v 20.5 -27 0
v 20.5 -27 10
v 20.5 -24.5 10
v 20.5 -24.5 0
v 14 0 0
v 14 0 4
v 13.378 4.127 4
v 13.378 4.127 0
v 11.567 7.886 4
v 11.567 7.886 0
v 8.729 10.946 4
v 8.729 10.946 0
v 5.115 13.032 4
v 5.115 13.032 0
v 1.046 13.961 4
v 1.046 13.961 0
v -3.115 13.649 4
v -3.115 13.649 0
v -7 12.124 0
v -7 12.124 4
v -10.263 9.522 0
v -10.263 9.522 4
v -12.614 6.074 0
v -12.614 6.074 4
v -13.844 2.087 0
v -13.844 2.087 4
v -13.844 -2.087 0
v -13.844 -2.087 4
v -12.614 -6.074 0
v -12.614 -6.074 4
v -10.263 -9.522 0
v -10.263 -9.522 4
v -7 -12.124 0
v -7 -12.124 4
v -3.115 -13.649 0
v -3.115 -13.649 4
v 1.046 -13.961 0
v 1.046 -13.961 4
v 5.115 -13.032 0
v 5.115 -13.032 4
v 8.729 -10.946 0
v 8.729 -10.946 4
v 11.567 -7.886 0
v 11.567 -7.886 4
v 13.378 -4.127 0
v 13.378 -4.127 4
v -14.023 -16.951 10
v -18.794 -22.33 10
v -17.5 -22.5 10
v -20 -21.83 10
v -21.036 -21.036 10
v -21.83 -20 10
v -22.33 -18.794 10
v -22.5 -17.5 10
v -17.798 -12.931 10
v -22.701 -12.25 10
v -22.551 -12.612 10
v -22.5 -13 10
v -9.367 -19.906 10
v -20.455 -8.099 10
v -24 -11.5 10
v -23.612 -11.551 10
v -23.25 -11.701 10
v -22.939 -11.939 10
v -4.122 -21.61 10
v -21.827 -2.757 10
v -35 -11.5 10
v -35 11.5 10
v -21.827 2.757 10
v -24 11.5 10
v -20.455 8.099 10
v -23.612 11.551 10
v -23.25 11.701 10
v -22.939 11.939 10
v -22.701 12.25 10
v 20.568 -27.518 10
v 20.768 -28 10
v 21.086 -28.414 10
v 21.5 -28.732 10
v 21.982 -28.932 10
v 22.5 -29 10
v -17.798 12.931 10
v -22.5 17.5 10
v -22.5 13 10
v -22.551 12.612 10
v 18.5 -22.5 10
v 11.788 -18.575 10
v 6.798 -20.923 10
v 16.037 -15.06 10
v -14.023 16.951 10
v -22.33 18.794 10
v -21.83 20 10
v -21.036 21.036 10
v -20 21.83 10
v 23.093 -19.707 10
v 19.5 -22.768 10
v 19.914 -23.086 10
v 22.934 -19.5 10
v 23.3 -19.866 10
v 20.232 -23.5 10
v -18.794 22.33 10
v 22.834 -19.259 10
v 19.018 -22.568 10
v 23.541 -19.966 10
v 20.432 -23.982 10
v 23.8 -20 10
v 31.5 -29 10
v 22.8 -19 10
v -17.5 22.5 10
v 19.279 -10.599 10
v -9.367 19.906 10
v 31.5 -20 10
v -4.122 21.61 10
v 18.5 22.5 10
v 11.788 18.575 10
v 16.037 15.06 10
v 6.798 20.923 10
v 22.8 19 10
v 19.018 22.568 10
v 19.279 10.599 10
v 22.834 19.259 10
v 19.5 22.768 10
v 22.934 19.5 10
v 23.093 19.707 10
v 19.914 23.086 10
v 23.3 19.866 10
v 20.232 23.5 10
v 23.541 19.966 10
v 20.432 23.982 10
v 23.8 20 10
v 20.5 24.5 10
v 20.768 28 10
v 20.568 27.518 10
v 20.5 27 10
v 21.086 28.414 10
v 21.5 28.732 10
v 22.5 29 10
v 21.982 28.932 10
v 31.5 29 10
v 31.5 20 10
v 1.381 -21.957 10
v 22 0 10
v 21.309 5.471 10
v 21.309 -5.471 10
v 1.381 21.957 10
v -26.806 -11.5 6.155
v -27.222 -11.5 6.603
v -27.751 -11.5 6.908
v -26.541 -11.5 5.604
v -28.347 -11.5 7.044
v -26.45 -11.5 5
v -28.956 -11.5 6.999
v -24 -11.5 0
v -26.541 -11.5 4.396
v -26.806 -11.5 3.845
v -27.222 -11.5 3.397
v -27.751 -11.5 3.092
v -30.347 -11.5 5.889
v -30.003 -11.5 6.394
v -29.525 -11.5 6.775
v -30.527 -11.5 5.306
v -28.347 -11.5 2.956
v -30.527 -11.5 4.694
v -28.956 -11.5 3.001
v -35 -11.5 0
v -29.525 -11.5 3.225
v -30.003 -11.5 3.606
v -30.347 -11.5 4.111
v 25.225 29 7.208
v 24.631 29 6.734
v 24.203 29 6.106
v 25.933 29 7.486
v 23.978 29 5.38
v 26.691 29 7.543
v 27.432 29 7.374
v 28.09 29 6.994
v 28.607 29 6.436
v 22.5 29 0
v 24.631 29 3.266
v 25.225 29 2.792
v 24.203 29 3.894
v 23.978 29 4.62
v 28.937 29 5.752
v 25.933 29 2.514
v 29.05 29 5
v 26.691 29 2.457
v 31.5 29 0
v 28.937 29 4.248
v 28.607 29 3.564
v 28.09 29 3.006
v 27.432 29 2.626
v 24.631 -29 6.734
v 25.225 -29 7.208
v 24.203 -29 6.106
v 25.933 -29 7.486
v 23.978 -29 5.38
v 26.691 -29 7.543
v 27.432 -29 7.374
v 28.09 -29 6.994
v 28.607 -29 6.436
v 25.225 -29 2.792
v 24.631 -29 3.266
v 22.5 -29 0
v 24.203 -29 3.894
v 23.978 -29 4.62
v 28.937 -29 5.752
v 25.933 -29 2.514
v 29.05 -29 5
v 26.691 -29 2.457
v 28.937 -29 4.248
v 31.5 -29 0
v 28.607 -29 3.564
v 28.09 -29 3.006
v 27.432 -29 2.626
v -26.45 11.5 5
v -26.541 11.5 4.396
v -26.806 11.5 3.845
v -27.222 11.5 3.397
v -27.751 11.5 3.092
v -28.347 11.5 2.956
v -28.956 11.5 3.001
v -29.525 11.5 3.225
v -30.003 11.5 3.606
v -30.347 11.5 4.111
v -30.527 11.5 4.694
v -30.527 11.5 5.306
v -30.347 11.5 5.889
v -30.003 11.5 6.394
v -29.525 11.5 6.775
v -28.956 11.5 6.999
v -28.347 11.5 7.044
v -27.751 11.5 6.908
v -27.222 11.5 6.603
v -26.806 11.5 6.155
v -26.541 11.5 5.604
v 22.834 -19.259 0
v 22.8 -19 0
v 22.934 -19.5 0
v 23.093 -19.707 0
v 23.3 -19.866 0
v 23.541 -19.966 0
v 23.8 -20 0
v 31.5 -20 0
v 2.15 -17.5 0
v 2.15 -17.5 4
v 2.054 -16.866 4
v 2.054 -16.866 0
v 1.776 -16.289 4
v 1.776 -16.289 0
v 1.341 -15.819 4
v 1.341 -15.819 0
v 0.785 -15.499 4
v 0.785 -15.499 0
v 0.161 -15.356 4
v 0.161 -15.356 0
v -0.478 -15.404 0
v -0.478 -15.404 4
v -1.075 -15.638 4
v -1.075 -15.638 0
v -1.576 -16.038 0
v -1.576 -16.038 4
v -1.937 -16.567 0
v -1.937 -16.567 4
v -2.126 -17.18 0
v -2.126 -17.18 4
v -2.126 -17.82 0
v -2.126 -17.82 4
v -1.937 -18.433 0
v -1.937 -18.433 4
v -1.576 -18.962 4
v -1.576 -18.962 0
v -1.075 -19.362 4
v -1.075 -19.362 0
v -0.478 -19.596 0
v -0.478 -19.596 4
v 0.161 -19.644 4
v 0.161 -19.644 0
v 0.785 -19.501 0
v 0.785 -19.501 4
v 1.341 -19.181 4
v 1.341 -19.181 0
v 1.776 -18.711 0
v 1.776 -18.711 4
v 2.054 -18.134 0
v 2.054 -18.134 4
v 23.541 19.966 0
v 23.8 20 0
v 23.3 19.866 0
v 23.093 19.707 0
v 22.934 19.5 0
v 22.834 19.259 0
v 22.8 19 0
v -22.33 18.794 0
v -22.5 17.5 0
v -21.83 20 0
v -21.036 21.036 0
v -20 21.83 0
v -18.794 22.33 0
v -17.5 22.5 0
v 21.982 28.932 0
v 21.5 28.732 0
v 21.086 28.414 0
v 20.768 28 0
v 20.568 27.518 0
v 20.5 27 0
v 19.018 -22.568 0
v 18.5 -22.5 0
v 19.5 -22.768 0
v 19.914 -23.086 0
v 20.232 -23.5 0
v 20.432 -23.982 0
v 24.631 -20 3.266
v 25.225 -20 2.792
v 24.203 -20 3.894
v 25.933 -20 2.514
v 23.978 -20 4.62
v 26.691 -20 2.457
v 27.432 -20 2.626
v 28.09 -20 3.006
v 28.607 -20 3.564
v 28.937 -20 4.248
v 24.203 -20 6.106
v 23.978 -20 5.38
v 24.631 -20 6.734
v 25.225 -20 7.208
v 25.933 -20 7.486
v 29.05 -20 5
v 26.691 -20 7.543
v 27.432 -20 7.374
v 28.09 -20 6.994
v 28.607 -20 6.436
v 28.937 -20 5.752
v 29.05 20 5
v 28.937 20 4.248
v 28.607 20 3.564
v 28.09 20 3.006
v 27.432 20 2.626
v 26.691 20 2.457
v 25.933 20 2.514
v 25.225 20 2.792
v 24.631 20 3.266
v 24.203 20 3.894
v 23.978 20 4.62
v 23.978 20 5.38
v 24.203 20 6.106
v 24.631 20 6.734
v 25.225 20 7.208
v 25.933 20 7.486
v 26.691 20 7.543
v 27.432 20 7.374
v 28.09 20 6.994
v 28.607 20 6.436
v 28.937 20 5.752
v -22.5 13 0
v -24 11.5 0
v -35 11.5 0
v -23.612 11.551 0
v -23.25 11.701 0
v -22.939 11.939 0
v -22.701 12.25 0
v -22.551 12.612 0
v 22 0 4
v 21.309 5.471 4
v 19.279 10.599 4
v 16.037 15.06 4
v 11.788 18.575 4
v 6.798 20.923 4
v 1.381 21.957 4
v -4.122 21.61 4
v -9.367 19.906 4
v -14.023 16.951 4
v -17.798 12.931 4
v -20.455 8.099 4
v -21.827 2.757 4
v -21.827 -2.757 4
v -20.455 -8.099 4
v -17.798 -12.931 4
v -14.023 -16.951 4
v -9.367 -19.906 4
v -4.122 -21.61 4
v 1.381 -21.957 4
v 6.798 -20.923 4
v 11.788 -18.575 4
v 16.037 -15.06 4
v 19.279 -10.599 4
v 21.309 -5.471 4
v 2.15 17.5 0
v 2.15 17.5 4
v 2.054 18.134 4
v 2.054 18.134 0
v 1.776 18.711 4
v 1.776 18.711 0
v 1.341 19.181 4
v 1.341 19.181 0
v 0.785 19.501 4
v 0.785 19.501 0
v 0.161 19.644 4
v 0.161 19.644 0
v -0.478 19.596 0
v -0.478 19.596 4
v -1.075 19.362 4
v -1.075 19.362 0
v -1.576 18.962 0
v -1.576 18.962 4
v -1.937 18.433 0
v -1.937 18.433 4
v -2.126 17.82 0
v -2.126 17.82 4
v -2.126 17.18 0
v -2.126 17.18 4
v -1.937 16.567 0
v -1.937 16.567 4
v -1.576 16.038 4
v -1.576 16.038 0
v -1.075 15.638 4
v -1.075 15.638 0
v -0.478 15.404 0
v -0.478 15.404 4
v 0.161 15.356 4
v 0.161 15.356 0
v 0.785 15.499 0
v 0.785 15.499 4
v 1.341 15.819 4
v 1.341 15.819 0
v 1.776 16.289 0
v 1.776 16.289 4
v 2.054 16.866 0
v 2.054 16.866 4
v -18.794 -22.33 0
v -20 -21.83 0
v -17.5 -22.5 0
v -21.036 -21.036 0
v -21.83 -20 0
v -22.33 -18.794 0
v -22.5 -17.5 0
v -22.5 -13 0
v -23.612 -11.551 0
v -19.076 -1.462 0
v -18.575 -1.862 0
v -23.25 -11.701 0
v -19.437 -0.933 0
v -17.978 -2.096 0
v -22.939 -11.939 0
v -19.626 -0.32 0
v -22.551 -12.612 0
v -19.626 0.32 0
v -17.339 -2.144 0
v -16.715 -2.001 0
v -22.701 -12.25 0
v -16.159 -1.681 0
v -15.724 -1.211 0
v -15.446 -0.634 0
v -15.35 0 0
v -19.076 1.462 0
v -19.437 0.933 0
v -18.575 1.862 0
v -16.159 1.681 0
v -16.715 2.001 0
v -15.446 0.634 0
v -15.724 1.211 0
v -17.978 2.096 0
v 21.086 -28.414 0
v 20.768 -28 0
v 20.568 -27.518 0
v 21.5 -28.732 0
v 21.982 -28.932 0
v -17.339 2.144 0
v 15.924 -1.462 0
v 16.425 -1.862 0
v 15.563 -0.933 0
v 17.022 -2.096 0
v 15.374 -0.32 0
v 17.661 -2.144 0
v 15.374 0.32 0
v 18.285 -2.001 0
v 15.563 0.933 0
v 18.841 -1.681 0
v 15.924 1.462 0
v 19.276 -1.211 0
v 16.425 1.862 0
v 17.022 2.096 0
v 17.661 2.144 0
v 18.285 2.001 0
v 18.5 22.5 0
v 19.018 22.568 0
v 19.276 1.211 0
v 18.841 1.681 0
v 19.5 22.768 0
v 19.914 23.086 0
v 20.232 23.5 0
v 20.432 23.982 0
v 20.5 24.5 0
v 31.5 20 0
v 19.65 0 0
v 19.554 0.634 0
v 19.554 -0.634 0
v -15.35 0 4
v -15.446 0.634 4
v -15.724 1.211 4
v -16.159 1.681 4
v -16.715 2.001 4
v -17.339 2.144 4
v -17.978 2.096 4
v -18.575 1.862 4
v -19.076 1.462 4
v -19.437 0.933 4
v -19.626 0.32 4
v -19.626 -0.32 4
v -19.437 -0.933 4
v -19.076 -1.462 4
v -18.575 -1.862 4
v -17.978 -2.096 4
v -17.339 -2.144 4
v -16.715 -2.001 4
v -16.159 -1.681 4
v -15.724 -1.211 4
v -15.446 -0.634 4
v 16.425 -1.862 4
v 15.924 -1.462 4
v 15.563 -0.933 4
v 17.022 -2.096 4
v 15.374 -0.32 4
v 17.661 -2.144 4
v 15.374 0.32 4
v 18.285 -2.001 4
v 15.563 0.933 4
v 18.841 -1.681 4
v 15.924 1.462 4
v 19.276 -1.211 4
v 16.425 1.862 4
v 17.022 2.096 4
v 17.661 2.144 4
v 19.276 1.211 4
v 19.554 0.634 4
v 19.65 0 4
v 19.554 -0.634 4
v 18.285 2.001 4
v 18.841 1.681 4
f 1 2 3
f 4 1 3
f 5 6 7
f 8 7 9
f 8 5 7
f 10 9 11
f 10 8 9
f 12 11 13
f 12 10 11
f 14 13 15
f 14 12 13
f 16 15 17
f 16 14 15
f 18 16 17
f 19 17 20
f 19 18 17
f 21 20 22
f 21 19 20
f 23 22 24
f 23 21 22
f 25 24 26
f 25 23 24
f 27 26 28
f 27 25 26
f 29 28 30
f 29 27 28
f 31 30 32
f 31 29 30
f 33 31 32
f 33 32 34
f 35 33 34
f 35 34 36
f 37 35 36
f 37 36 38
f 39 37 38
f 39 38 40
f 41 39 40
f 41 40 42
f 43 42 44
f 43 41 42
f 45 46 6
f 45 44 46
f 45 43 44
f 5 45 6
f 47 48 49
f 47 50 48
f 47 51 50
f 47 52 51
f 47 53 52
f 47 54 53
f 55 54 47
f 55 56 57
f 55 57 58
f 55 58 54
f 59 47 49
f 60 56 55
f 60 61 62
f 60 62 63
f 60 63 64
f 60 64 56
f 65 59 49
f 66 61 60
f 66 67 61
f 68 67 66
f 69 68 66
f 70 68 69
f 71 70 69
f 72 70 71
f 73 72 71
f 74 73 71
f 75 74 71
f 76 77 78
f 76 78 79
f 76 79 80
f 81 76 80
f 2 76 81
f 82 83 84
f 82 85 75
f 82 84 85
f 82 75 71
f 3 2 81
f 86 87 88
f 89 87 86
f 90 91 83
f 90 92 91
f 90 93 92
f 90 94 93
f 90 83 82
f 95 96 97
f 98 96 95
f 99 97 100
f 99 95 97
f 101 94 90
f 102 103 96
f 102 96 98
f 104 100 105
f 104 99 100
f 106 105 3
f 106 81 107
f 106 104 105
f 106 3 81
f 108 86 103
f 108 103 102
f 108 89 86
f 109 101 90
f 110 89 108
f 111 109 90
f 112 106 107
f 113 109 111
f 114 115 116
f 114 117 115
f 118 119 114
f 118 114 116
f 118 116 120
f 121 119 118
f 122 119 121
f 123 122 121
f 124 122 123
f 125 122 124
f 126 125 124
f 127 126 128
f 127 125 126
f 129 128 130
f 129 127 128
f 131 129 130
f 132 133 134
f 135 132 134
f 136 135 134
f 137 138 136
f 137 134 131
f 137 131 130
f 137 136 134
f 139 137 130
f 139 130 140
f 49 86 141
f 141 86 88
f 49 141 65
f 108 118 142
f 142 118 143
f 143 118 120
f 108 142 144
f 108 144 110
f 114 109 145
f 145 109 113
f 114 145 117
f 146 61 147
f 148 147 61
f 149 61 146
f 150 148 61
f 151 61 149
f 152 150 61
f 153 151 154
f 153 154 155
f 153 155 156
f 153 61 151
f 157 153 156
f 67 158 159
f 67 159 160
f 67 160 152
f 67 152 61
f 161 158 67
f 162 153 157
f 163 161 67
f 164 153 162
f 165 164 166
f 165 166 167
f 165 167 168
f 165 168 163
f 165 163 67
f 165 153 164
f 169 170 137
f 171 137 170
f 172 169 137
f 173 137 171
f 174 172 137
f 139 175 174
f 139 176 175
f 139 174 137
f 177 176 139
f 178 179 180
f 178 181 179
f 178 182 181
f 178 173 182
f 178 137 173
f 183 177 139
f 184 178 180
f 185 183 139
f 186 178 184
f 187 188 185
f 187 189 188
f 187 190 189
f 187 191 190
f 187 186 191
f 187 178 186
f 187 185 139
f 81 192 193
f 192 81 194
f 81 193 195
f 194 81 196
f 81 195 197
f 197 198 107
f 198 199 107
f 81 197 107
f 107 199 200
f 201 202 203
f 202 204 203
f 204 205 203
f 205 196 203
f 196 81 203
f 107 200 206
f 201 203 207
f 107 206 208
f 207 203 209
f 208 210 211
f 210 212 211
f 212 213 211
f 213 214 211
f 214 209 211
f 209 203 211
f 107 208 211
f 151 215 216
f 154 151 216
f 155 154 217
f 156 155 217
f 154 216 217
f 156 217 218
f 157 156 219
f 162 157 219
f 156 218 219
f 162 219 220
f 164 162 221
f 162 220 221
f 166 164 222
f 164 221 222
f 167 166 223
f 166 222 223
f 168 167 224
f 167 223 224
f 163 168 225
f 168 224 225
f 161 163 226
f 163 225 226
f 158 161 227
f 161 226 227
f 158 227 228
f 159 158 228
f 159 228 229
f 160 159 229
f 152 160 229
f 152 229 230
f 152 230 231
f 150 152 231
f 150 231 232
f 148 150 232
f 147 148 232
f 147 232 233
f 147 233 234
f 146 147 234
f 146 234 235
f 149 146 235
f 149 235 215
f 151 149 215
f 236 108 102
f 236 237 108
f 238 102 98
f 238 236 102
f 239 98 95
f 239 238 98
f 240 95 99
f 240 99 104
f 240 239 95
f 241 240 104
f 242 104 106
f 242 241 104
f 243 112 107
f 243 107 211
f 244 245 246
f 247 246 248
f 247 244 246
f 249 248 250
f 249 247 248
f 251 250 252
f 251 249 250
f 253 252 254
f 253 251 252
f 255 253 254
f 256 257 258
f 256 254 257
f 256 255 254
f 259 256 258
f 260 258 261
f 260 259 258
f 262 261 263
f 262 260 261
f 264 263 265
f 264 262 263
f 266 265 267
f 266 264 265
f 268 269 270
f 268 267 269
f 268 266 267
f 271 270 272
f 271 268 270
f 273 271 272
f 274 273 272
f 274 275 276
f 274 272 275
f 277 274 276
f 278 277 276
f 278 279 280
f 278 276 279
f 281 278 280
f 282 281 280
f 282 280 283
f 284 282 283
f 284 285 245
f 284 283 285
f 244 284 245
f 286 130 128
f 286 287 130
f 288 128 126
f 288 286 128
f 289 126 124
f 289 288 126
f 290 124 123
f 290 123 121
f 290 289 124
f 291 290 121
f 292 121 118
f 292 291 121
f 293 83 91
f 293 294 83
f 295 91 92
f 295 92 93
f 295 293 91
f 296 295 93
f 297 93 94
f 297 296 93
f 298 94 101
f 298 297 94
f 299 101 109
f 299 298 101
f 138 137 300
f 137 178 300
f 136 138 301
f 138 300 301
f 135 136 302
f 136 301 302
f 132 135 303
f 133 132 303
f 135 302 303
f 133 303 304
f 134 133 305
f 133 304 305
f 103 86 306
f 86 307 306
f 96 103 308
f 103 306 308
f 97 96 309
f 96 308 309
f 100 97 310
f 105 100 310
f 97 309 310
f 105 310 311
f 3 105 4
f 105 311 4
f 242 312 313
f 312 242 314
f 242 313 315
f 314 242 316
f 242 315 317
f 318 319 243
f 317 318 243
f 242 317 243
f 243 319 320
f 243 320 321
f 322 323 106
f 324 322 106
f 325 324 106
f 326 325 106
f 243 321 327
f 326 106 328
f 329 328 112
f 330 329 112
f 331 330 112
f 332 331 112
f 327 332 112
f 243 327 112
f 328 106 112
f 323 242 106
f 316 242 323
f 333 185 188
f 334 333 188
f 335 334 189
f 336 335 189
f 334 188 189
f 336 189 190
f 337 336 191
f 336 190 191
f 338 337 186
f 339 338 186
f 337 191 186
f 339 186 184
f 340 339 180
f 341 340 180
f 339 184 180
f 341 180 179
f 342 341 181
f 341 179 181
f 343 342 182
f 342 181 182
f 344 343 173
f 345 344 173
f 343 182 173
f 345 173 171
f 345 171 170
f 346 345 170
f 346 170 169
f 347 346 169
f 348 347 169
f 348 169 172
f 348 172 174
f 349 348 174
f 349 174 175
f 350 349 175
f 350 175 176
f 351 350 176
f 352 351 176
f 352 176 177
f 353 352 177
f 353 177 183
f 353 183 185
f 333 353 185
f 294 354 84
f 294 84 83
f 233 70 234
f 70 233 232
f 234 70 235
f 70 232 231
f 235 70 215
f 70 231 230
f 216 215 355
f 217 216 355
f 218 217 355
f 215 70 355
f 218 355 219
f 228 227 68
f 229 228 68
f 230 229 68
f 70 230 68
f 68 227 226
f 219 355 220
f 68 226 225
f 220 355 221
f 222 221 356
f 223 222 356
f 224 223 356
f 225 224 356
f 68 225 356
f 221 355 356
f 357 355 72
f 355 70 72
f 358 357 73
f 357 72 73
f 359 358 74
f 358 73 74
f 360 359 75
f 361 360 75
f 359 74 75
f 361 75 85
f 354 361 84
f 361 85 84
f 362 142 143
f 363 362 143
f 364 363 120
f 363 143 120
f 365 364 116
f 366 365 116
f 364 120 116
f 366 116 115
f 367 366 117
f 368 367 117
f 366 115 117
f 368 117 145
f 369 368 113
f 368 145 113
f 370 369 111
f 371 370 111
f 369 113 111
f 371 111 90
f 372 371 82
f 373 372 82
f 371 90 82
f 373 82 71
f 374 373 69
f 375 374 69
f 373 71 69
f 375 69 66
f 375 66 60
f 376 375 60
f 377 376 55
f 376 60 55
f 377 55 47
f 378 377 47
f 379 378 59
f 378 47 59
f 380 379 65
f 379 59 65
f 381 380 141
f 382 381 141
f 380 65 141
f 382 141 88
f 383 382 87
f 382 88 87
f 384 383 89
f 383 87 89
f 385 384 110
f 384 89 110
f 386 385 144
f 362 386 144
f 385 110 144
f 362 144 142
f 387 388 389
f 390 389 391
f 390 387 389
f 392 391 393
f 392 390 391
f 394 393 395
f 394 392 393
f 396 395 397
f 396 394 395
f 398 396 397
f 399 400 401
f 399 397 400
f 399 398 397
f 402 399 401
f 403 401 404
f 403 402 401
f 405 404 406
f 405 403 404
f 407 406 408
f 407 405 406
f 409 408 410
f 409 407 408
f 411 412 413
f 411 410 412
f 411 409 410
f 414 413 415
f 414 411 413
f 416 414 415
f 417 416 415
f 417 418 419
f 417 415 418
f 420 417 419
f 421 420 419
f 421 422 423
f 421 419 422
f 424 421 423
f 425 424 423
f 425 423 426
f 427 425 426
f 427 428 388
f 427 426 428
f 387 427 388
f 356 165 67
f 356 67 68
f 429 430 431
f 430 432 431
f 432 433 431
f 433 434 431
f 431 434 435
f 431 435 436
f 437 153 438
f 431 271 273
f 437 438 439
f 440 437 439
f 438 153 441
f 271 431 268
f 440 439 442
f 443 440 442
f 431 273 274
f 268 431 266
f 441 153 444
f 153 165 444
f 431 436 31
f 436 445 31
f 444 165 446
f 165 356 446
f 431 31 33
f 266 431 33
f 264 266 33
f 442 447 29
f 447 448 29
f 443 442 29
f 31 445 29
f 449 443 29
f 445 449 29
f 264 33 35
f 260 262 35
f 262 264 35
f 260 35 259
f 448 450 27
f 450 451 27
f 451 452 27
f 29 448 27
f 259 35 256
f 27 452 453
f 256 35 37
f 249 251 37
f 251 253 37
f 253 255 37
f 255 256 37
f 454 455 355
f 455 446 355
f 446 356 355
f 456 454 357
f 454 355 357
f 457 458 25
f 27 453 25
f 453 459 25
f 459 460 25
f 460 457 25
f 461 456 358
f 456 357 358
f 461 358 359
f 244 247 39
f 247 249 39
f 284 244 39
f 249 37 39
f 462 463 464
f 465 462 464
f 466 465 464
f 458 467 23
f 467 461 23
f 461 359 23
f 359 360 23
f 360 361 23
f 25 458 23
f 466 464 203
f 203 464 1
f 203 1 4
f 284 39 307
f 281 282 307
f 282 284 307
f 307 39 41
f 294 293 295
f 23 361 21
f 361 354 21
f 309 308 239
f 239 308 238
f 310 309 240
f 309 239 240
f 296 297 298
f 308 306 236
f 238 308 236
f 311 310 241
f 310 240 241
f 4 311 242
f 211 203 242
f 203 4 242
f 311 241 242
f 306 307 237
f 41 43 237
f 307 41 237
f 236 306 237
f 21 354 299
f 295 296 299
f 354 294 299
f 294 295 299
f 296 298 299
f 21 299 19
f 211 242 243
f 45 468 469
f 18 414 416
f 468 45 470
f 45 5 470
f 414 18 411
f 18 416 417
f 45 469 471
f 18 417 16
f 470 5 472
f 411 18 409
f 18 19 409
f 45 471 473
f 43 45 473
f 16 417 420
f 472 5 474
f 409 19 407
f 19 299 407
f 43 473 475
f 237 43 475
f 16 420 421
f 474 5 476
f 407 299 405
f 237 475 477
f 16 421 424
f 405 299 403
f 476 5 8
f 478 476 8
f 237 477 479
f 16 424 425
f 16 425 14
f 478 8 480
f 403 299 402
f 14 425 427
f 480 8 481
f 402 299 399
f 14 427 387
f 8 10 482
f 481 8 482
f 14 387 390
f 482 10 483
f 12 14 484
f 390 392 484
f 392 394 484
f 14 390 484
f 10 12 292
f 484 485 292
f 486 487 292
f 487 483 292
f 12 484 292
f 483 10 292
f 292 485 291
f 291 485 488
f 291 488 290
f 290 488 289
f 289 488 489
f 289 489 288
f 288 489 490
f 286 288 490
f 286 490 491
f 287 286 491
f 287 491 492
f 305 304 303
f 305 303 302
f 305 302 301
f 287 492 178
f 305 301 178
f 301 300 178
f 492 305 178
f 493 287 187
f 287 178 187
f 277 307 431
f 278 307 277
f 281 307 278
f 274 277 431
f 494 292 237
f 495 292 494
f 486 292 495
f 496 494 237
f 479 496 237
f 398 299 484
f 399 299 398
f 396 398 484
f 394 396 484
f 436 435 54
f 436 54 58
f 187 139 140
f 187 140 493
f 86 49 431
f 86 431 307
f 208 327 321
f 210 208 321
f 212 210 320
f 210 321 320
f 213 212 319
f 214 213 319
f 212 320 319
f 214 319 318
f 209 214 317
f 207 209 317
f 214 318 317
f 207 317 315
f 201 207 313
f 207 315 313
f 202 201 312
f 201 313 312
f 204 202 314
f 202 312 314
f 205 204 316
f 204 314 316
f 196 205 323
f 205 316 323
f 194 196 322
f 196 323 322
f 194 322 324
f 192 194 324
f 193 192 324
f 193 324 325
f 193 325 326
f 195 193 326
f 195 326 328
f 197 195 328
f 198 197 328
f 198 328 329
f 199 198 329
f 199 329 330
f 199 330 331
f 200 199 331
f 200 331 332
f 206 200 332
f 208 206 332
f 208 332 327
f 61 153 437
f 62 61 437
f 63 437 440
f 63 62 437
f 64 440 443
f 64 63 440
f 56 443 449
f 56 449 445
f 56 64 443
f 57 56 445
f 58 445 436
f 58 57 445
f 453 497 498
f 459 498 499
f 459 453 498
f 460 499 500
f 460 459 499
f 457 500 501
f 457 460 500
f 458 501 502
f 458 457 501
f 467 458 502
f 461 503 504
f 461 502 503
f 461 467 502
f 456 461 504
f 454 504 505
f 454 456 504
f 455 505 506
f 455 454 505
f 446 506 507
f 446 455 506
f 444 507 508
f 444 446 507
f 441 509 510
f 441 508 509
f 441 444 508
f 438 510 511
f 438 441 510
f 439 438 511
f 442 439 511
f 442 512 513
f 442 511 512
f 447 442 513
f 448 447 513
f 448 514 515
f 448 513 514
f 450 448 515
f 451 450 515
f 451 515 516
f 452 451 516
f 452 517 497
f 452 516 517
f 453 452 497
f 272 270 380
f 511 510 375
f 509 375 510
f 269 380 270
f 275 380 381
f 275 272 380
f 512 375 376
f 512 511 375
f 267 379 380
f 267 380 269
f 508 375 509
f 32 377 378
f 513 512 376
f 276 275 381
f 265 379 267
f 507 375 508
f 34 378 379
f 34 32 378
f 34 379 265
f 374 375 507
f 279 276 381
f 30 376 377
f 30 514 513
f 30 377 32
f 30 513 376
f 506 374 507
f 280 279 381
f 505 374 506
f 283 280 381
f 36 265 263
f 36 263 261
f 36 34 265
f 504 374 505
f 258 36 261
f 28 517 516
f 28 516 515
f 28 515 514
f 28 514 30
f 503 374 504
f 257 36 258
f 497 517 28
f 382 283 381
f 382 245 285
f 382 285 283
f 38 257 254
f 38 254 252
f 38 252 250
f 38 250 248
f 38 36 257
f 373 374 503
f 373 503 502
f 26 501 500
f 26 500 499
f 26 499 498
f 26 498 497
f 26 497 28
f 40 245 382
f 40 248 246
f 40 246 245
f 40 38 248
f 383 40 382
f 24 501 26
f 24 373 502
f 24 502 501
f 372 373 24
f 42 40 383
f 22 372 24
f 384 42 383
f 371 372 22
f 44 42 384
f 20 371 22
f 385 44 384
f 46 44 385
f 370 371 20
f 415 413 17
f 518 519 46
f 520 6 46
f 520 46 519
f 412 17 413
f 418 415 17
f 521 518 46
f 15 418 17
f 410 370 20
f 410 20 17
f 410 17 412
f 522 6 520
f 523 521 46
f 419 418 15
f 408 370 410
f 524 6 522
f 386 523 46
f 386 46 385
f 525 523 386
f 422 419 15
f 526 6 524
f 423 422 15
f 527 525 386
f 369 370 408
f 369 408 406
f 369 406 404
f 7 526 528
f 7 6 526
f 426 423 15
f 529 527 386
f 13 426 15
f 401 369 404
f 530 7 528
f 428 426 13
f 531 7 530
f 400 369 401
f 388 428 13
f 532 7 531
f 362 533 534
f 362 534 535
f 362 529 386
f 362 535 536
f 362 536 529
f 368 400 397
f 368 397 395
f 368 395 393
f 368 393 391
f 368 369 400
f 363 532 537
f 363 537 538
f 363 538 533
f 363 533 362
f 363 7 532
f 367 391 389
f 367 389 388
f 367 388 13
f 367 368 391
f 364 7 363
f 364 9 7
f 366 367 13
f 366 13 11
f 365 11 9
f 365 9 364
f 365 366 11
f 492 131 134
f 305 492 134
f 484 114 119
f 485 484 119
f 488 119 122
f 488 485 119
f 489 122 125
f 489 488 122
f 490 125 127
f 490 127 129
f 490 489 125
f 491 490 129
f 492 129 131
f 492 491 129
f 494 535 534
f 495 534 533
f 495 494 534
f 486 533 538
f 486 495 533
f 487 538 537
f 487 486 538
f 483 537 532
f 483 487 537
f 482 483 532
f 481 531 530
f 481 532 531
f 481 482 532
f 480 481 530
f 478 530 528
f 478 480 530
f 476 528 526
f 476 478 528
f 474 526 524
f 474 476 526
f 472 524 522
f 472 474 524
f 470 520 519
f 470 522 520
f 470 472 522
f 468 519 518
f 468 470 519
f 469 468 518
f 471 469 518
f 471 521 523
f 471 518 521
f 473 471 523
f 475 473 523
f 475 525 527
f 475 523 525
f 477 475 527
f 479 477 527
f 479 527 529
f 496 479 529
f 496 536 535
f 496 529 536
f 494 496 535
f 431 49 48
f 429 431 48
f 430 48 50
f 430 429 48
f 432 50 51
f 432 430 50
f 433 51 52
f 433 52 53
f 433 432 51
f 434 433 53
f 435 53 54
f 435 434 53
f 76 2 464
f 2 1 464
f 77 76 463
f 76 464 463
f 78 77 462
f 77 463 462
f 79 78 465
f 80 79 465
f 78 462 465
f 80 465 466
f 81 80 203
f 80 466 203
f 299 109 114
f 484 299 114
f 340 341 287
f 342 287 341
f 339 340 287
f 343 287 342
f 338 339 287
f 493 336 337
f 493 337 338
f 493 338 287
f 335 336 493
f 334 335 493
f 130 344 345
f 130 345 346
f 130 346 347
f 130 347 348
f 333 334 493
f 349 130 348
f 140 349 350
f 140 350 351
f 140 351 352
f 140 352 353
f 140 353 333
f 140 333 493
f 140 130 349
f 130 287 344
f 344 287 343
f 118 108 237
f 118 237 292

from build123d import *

# Parameters (mm, degrees)
SKETCH_1_W               = 70
SKETCH_1_H               = 58
SKETCH_1_R               = 2.15
SKETCH_1_R_2             = 14
EXTRUDE_1_DEPTH          = 10
SKETCH_2_R               = 22
CUT_EXTRUDE_1_DEPTH      = 6
SKETCH_3_R               = 2.55
CUT_EXTRUDE_2_DEPTH      = 1
CUT_EXTRUDE_2_DEPTH_BACK = 59
SKETCH_4_R               = 2.05
CUT_EXTRUDE_3_DEPTH      = 1
CUT_EXTRUDE_3_DEPTH_BACK = 59
SKETCH_6_W               = 12.5
SKETCH_6_H               = 17.5
CUT_EXTRUDE_4_DEPTH      = 11
FILLET_1_R               = 1.5
SKETCH_7_W               = 3.5
SKETCH_7_H               = 10
CUT_EXTRUDE_5_DEPTH      = 1
CUT_EXTRUDE_5_DEPTH_BACK = 59
SKETCH_8_W               = 8.7
SKETCH_8_H               = 40
CUT_EXTRUDE_6_DEPTH      = 11
FILLET_3_R               = 1
SKETCH_9_W               = 43
SKETCH_9_H               = 6.5
CUT_EXTRUDE_7_DEPTH      = 11
FILLET_4_R               = 5
FILLET_5_R               = 2


with BuildPart() as part:
    # 草图1 → 凸台-拉伸1 (new body)
    with BuildSketch(Plane.XY):
        Rectangle(SKETCH_1_W, SKETCH_1_H)
        with Locations((17.5, 0)):
            Circle(SKETCH_1_R, mode=Mode.SUBTRACT)
        with Locations((0, -17.5)):
            Circle(SKETCH_1_R, mode=Mode.SUBTRACT)
        with Locations((-17.5, 0)):
            Circle(SKETCH_1_R, mode=Mode.SUBTRACT)
        with Locations((0, 17.5)):
            Circle(SKETCH_1_R, mode=Mode.SUBTRACT)
        Circle(SKETCH_1_R_2, mode=Mode.SUBTRACT)
    extrude(amount=EXTRUDE_1_DEPTH)

    # 草图2 → 切除-拉伸1 (cut)
    with BuildSketch(Plane.XY.offset(10)):
        Circle(SKETCH_2_R)
    extrude(amount=-CUT_EXTRUDE_1_DEPTH, mode=Mode.SUBTRACT)

    # 草图3 → 切除-拉伸2 (cut, two sides)
    with BuildSketch(Plane(origin=(0, 29, 0), x_dir=(1, 0, 0), z_dir=(0, 1, 0))) as cut_extrude_2_sk:
        with Locations((26.5, -5)):
            Circle(SKETCH_3_R)
    extrude(amount=CUT_EXTRUDE_2_DEPTH, mode=Mode.SUBTRACT)
    extrude(cut_extrude_2_sk.sketch, amount=-CUT_EXTRUDE_2_DEPTH_BACK, mode=Mode.SUBTRACT)

    # 草图4 → 切除-拉伸3 (cut, two sides)
    with BuildSketch(Plane(origin=(0, 29, 0), x_dir=(1, 0, 0), z_dir=(0, 1, 0))) as cut_extrude_3_sk:
        with Locations((-28.5, -5)):
            Circle(SKETCH_4_R)
    extrude(amount=CUT_EXTRUDE_3_DEPTH, mode=Mode.SUBTRACT)
    extrude(cut_extrude_3_sk.sketch, amount=-CUT_EXTRUDE_3_DEPTH_BACK, mode=Mode.SUBTRACT)

    # 草图6 → 切除-拉伸4 (cut, through all)
    with BuildSketch(Plane(origin=(0, 0, 0), x_dir=(-1, 0, 0), z_dir=(0, 0, -1))):
        with Locations((28.75, 20.25)):
            Rectangle(SKETCH_6_W, SKETCH_6_H)
        with Locations((28.75, -20.25)):
            Rectangle(SKETCH_6_W, SKETCH_6_H)
    extrude(amount=-CUT_EXTRUDE_4_DEPTH, mode=Mode.SUBTRACT)

    # 圆角1
    fillet_1_edges = [part.edges().sort_by_distance(p)[0] for p in [
        (-22.5, 11.5, 5),
        (-22.5, -11.5, 5),
    ]]
    fillet(fillet_1_edges, radius=FILLET_1_R)

    # 草图7 → 切除-拉伸5 (cut, two sides)
    with BuildSketch(Plane(origin=(0, 29, 0), x_dir=(1, 0, 0), z_dir=(0, 1, 0))) as cut_extrude_5_sk:
        with Locations((33.25, -5)):
            Rectangle(SKETCH_7_W, SKETCH_7_H)
    extrude(amount=CUT_EXTRUDE_5_DEPTH, mode=Mode.SUBTRACT)
    extrude(cut_extrude_5_sk.sketch, amount=-CUT_EXTRUDE_5_DEPTH_BACK, mode=Mode.SUBTRACT)

    # 草图8 → 切除-拉伸6 (cut, through all)
    with BuildSketch(Plane.XY.offset(10)):
        with Locations((27.15, 0)):
            Rectangle(SKETCH_8_W, SKETCH_8_H)
    extrude(amount=-CUT_EXTRUDE_6_DEPTH, mode=Mode.SUBTRACT)

    # 圆角3
    fillet_3_edges = [part.edges().sort_by_distance(p)[0] for p in [
        (22.8, 20, 5),
        (22.8, -20, 5),
    ]]
    fillet(fillet_3_edges, radius=FILLET_3_R)

    # 草图9 → 切除-拉伸7 (cut, through all)
    with BuildSketch(Plane.XY.offset(10)):
        with Locations((-1, -25.75)):
            Rectangle(SKETCH_9_W, SKETCH_9_H)
        with Locations((-1, 25.75)):
            Rectangle(SKETCH_9_W, SKETCH_9_H)
    extrude(amount=-CUT_EXTRUDE_7_DEPTH, mode=Mode.SUBTRACT)

    # 圆角4
    fillet_4_edges = [part.edges().sort_by_distance(p)[0] for p in [
        (-22.5, -22.5, 5),
        (-22.5, 22.5, 5),
    ]]
    fillet(fillet_4_edges, radius=FILLET_4_R)

    # 圆角5
    fillet_5_edges = [part.edges().sort_by_distance(p)[0] for p in [
        (20.5, -22.5, 5),
        (20.5, -29, 5),
        (20.5, 29, 5),
        (20.5, 22.5, 5),
    ]]
    fillet(fillet_5_edges, radius=FILLET_5_R)


solid = part.part
